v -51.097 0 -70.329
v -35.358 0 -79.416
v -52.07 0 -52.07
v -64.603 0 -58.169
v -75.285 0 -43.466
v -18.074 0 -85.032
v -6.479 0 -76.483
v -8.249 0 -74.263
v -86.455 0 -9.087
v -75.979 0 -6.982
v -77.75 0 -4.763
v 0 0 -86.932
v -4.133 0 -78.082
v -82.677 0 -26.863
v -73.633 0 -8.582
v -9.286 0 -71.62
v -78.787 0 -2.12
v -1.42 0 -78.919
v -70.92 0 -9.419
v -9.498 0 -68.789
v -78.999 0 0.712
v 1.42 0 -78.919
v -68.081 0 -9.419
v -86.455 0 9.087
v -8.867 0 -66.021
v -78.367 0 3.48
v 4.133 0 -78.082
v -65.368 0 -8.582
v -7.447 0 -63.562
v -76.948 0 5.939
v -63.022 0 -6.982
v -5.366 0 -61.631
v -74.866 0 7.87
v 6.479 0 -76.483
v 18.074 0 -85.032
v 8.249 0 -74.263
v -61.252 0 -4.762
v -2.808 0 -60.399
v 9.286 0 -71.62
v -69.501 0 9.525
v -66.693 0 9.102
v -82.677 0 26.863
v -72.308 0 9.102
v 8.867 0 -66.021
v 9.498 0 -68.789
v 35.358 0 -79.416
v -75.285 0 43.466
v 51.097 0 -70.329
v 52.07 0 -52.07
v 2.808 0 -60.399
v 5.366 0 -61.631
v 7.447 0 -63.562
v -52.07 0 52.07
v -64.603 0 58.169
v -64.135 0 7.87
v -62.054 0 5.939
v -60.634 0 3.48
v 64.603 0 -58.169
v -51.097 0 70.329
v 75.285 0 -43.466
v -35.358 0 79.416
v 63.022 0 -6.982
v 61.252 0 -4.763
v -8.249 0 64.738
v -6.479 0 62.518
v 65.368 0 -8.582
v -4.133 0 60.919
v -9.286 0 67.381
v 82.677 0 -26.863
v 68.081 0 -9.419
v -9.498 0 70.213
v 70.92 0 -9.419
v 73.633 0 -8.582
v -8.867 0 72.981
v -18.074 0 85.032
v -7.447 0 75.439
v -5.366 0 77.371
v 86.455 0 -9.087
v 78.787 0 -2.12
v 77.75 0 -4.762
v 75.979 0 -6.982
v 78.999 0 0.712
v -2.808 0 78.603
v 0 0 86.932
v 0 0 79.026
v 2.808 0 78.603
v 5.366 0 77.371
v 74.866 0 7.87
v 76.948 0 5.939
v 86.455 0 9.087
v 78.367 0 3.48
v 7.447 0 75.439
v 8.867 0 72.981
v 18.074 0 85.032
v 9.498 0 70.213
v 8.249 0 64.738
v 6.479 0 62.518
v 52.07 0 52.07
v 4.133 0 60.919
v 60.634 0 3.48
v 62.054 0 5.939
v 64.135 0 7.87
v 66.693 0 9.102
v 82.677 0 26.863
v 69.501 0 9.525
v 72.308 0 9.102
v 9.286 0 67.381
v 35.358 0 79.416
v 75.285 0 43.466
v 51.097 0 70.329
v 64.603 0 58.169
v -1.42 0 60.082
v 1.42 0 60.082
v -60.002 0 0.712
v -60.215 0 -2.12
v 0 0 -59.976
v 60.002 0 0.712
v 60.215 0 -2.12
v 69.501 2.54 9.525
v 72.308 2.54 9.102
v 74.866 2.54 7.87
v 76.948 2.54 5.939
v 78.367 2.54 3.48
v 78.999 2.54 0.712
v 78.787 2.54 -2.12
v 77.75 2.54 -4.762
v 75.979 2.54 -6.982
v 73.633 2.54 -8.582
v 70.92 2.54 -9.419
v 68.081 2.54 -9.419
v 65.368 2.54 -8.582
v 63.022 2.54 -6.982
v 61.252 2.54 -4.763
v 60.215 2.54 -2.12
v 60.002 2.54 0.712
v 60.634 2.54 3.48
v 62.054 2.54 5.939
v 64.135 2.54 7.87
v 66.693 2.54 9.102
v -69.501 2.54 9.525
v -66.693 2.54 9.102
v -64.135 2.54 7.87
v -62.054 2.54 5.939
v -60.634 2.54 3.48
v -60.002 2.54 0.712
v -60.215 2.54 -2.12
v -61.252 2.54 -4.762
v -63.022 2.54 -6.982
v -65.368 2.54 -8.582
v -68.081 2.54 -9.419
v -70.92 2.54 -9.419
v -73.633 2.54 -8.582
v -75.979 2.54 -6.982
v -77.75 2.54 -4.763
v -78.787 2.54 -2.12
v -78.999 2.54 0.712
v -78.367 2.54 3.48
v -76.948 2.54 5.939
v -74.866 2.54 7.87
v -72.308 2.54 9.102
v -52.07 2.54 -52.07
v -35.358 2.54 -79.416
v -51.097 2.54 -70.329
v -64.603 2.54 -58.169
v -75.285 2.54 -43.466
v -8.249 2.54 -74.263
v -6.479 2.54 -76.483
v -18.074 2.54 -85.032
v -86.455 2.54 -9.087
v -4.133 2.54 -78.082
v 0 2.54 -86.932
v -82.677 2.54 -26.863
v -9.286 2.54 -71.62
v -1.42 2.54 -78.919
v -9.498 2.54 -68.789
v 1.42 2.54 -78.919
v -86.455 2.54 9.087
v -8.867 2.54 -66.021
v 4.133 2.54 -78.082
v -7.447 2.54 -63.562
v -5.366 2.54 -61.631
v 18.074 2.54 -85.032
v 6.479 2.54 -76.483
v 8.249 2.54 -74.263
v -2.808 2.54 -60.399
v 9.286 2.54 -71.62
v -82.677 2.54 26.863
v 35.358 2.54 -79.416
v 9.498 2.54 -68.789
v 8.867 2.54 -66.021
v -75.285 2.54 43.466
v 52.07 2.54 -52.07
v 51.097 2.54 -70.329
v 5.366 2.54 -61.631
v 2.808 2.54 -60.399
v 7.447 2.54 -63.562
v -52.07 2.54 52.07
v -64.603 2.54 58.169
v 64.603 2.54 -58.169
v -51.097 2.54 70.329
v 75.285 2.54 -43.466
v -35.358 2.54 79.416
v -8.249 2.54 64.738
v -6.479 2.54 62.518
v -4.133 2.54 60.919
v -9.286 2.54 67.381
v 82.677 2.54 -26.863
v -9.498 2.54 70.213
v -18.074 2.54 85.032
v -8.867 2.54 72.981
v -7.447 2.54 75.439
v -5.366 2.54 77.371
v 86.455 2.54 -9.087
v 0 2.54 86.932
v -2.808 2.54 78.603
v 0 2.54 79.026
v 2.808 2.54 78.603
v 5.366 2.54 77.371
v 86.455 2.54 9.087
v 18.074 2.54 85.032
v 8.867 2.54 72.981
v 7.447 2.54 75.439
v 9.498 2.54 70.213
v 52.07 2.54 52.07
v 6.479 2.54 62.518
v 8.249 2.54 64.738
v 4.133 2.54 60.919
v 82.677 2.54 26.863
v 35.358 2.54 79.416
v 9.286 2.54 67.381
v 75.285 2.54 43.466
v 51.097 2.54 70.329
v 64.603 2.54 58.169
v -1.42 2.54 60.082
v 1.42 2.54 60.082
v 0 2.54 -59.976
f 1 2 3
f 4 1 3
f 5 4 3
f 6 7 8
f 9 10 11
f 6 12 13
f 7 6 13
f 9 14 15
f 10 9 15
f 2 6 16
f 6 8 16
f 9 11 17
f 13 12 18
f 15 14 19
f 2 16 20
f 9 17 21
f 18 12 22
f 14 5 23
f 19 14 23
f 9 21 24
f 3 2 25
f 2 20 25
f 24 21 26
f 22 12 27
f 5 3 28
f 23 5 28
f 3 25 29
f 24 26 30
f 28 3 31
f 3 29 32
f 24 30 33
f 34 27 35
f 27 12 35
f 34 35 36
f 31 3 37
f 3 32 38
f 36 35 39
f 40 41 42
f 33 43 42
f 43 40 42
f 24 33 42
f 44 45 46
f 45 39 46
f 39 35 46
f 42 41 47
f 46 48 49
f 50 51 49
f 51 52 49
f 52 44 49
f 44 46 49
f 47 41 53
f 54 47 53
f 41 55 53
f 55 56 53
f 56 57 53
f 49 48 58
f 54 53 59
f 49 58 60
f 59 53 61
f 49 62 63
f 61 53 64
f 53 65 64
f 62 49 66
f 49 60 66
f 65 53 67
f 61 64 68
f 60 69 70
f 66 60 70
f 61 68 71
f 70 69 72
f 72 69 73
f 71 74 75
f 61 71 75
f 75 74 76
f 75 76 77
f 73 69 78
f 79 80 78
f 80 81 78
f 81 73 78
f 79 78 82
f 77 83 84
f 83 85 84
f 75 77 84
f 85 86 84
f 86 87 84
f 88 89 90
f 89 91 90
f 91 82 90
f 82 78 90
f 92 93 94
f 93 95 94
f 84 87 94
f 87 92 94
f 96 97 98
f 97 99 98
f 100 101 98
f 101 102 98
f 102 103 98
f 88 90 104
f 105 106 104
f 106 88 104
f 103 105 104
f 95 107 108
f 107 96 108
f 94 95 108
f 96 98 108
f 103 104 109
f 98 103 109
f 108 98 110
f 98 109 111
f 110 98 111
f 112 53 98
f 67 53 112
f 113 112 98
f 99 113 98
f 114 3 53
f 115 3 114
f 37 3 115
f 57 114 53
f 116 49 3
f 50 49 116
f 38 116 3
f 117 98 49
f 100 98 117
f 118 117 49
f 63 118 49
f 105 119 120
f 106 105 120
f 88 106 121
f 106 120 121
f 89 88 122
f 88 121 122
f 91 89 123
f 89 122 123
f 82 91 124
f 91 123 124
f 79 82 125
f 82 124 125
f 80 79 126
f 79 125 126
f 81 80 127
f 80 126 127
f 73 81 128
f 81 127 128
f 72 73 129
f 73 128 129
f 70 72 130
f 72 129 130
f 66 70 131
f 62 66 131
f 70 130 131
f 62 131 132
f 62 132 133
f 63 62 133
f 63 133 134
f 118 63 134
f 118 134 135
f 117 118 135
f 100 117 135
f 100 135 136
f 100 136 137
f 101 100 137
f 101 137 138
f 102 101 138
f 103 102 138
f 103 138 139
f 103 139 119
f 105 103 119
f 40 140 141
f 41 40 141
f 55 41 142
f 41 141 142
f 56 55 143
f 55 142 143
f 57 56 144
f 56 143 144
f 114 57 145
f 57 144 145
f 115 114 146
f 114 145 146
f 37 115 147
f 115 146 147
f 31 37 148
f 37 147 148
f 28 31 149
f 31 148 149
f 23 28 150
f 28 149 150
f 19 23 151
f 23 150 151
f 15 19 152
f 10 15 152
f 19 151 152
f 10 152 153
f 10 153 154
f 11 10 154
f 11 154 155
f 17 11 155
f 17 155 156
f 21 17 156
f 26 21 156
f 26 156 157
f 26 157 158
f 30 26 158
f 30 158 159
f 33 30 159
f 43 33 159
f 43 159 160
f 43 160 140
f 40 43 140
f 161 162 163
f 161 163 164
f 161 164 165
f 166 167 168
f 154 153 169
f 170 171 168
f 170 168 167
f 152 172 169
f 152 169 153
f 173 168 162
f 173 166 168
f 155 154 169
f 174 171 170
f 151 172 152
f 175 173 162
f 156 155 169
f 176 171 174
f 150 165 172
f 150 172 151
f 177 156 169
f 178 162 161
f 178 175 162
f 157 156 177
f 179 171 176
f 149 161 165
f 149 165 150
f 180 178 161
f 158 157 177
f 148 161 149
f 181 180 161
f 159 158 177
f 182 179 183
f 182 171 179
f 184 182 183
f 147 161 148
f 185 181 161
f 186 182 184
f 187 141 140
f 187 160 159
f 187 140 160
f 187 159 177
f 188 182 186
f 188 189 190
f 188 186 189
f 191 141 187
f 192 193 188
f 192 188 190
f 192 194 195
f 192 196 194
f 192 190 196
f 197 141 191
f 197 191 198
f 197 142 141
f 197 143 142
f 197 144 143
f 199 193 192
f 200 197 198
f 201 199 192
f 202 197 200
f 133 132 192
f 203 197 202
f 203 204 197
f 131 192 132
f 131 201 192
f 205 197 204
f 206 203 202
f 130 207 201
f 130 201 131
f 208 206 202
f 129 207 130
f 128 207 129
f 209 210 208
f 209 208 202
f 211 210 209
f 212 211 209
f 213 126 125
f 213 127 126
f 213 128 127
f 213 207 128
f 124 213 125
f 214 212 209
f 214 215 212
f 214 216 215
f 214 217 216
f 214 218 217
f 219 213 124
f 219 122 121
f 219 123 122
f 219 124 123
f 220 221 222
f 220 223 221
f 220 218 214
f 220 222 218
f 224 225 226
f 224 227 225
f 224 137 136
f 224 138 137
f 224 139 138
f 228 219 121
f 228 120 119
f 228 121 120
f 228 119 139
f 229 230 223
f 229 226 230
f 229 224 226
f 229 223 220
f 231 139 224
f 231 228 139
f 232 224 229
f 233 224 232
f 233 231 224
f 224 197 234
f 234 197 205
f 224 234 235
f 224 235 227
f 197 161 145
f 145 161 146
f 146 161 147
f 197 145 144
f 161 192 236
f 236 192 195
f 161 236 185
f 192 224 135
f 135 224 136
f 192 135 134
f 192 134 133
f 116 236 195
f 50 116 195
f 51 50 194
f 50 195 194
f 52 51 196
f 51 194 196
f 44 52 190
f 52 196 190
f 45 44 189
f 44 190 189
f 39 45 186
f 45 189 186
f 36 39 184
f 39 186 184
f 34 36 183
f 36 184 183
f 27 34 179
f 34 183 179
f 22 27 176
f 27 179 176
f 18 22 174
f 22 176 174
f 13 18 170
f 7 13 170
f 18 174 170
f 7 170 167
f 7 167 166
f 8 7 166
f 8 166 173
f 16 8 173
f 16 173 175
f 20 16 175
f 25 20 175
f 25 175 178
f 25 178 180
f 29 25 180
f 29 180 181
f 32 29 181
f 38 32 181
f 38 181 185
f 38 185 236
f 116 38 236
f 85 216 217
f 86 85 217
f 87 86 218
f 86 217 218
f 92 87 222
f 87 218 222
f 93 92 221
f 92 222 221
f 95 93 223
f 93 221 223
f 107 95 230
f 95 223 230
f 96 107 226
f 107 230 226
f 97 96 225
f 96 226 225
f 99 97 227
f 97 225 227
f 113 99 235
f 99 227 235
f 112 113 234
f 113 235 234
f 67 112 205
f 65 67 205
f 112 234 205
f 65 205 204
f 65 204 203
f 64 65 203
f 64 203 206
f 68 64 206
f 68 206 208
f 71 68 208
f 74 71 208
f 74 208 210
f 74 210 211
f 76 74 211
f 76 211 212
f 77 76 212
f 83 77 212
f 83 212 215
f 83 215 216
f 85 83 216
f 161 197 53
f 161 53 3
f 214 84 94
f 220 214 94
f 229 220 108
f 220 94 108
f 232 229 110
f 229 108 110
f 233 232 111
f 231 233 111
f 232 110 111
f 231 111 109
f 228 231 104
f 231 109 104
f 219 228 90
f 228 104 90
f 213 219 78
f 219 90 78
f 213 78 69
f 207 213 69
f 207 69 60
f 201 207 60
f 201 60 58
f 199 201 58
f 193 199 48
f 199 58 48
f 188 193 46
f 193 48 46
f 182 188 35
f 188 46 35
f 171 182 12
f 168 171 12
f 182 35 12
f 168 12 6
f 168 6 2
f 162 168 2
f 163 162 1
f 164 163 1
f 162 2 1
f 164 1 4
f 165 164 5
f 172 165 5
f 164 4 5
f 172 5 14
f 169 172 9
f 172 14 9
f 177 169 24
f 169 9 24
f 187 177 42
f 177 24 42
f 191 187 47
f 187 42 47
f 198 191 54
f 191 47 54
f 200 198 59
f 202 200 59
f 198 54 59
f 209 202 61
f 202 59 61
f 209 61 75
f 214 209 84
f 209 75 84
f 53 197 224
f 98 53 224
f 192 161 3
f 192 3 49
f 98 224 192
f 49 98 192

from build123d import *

# Parameters (mm, degrees)
SKETCH1_R           = 86.9315
BOSS_EXTRUDE1_DEPTH = 2.54
SKETCH2_W           = 104.14
SKETCH2_H           = 104.14
CUT_EXTRUDE1_DEPTH  = 2.54
SKETCH3_R           = 9.525
SKETCH3_W           = 104.14
SKETCH3_H           = 104.14
CUT_EXTRUDE3_DEPTH  = 203.2


with BuildPart() as part:
    # Sketch1 → Boss-Extrude1 (new body)
    with BuildSketch(Plane(origin=(0, 0, 0), x_dir=(1, 0, 0), z_dir=(0, 1, 0))):
        with Locations(Location((0, 0, 0), (0, 0, 270))):
            Circle(SKETCH1_R)
    extrude(amount=BOSS_EXTRUDE1_DEPTH)

    # Sketch2 → Cut-Extrude1 (cut)
    with BuildSketch(Plane(origin=(0, 2.54, 0), x_dir=(1, 0, 0), z_dir=(0, 1, 0))):
        Rectangle(SKETCH2_W, SKETCH2_H)
    extrude(amount=-CUT_EXTRUDE1_DEPTH, mode=Mode.SUBTRACT)

    # Sketch3 → Cut-Extrude3 (cut)
    with BuildSketch(Plane(origin=(0, 2.54, 0), x_dir=(1, 0, 0), z_dir=(0, 1, 0))):
        with Locations(Location((0, 69.50075, 0), (0, 0, 270))):
            Circle(SKETCH3_R)
        with Locations(Location((69.50075, 0, 0), (0, 0, 270))):
            Circle(SKETCH3_R)
        with Locations(Location((0, -69.50075, 0), (0, 0, 270))):
            Circle(SKETCH3_R)
        with Locations(Location((-69.50075, 0, 0), (0, 0, 270))):
            Circle(SKETCH3_R)
        Rectangle(SKETCH3_W, SKETCH3_H)
    extrude(amount=-CUT_EXTRUDE3_DEPTH, mode=Mode.SUBTRACT)


solid = part.part
